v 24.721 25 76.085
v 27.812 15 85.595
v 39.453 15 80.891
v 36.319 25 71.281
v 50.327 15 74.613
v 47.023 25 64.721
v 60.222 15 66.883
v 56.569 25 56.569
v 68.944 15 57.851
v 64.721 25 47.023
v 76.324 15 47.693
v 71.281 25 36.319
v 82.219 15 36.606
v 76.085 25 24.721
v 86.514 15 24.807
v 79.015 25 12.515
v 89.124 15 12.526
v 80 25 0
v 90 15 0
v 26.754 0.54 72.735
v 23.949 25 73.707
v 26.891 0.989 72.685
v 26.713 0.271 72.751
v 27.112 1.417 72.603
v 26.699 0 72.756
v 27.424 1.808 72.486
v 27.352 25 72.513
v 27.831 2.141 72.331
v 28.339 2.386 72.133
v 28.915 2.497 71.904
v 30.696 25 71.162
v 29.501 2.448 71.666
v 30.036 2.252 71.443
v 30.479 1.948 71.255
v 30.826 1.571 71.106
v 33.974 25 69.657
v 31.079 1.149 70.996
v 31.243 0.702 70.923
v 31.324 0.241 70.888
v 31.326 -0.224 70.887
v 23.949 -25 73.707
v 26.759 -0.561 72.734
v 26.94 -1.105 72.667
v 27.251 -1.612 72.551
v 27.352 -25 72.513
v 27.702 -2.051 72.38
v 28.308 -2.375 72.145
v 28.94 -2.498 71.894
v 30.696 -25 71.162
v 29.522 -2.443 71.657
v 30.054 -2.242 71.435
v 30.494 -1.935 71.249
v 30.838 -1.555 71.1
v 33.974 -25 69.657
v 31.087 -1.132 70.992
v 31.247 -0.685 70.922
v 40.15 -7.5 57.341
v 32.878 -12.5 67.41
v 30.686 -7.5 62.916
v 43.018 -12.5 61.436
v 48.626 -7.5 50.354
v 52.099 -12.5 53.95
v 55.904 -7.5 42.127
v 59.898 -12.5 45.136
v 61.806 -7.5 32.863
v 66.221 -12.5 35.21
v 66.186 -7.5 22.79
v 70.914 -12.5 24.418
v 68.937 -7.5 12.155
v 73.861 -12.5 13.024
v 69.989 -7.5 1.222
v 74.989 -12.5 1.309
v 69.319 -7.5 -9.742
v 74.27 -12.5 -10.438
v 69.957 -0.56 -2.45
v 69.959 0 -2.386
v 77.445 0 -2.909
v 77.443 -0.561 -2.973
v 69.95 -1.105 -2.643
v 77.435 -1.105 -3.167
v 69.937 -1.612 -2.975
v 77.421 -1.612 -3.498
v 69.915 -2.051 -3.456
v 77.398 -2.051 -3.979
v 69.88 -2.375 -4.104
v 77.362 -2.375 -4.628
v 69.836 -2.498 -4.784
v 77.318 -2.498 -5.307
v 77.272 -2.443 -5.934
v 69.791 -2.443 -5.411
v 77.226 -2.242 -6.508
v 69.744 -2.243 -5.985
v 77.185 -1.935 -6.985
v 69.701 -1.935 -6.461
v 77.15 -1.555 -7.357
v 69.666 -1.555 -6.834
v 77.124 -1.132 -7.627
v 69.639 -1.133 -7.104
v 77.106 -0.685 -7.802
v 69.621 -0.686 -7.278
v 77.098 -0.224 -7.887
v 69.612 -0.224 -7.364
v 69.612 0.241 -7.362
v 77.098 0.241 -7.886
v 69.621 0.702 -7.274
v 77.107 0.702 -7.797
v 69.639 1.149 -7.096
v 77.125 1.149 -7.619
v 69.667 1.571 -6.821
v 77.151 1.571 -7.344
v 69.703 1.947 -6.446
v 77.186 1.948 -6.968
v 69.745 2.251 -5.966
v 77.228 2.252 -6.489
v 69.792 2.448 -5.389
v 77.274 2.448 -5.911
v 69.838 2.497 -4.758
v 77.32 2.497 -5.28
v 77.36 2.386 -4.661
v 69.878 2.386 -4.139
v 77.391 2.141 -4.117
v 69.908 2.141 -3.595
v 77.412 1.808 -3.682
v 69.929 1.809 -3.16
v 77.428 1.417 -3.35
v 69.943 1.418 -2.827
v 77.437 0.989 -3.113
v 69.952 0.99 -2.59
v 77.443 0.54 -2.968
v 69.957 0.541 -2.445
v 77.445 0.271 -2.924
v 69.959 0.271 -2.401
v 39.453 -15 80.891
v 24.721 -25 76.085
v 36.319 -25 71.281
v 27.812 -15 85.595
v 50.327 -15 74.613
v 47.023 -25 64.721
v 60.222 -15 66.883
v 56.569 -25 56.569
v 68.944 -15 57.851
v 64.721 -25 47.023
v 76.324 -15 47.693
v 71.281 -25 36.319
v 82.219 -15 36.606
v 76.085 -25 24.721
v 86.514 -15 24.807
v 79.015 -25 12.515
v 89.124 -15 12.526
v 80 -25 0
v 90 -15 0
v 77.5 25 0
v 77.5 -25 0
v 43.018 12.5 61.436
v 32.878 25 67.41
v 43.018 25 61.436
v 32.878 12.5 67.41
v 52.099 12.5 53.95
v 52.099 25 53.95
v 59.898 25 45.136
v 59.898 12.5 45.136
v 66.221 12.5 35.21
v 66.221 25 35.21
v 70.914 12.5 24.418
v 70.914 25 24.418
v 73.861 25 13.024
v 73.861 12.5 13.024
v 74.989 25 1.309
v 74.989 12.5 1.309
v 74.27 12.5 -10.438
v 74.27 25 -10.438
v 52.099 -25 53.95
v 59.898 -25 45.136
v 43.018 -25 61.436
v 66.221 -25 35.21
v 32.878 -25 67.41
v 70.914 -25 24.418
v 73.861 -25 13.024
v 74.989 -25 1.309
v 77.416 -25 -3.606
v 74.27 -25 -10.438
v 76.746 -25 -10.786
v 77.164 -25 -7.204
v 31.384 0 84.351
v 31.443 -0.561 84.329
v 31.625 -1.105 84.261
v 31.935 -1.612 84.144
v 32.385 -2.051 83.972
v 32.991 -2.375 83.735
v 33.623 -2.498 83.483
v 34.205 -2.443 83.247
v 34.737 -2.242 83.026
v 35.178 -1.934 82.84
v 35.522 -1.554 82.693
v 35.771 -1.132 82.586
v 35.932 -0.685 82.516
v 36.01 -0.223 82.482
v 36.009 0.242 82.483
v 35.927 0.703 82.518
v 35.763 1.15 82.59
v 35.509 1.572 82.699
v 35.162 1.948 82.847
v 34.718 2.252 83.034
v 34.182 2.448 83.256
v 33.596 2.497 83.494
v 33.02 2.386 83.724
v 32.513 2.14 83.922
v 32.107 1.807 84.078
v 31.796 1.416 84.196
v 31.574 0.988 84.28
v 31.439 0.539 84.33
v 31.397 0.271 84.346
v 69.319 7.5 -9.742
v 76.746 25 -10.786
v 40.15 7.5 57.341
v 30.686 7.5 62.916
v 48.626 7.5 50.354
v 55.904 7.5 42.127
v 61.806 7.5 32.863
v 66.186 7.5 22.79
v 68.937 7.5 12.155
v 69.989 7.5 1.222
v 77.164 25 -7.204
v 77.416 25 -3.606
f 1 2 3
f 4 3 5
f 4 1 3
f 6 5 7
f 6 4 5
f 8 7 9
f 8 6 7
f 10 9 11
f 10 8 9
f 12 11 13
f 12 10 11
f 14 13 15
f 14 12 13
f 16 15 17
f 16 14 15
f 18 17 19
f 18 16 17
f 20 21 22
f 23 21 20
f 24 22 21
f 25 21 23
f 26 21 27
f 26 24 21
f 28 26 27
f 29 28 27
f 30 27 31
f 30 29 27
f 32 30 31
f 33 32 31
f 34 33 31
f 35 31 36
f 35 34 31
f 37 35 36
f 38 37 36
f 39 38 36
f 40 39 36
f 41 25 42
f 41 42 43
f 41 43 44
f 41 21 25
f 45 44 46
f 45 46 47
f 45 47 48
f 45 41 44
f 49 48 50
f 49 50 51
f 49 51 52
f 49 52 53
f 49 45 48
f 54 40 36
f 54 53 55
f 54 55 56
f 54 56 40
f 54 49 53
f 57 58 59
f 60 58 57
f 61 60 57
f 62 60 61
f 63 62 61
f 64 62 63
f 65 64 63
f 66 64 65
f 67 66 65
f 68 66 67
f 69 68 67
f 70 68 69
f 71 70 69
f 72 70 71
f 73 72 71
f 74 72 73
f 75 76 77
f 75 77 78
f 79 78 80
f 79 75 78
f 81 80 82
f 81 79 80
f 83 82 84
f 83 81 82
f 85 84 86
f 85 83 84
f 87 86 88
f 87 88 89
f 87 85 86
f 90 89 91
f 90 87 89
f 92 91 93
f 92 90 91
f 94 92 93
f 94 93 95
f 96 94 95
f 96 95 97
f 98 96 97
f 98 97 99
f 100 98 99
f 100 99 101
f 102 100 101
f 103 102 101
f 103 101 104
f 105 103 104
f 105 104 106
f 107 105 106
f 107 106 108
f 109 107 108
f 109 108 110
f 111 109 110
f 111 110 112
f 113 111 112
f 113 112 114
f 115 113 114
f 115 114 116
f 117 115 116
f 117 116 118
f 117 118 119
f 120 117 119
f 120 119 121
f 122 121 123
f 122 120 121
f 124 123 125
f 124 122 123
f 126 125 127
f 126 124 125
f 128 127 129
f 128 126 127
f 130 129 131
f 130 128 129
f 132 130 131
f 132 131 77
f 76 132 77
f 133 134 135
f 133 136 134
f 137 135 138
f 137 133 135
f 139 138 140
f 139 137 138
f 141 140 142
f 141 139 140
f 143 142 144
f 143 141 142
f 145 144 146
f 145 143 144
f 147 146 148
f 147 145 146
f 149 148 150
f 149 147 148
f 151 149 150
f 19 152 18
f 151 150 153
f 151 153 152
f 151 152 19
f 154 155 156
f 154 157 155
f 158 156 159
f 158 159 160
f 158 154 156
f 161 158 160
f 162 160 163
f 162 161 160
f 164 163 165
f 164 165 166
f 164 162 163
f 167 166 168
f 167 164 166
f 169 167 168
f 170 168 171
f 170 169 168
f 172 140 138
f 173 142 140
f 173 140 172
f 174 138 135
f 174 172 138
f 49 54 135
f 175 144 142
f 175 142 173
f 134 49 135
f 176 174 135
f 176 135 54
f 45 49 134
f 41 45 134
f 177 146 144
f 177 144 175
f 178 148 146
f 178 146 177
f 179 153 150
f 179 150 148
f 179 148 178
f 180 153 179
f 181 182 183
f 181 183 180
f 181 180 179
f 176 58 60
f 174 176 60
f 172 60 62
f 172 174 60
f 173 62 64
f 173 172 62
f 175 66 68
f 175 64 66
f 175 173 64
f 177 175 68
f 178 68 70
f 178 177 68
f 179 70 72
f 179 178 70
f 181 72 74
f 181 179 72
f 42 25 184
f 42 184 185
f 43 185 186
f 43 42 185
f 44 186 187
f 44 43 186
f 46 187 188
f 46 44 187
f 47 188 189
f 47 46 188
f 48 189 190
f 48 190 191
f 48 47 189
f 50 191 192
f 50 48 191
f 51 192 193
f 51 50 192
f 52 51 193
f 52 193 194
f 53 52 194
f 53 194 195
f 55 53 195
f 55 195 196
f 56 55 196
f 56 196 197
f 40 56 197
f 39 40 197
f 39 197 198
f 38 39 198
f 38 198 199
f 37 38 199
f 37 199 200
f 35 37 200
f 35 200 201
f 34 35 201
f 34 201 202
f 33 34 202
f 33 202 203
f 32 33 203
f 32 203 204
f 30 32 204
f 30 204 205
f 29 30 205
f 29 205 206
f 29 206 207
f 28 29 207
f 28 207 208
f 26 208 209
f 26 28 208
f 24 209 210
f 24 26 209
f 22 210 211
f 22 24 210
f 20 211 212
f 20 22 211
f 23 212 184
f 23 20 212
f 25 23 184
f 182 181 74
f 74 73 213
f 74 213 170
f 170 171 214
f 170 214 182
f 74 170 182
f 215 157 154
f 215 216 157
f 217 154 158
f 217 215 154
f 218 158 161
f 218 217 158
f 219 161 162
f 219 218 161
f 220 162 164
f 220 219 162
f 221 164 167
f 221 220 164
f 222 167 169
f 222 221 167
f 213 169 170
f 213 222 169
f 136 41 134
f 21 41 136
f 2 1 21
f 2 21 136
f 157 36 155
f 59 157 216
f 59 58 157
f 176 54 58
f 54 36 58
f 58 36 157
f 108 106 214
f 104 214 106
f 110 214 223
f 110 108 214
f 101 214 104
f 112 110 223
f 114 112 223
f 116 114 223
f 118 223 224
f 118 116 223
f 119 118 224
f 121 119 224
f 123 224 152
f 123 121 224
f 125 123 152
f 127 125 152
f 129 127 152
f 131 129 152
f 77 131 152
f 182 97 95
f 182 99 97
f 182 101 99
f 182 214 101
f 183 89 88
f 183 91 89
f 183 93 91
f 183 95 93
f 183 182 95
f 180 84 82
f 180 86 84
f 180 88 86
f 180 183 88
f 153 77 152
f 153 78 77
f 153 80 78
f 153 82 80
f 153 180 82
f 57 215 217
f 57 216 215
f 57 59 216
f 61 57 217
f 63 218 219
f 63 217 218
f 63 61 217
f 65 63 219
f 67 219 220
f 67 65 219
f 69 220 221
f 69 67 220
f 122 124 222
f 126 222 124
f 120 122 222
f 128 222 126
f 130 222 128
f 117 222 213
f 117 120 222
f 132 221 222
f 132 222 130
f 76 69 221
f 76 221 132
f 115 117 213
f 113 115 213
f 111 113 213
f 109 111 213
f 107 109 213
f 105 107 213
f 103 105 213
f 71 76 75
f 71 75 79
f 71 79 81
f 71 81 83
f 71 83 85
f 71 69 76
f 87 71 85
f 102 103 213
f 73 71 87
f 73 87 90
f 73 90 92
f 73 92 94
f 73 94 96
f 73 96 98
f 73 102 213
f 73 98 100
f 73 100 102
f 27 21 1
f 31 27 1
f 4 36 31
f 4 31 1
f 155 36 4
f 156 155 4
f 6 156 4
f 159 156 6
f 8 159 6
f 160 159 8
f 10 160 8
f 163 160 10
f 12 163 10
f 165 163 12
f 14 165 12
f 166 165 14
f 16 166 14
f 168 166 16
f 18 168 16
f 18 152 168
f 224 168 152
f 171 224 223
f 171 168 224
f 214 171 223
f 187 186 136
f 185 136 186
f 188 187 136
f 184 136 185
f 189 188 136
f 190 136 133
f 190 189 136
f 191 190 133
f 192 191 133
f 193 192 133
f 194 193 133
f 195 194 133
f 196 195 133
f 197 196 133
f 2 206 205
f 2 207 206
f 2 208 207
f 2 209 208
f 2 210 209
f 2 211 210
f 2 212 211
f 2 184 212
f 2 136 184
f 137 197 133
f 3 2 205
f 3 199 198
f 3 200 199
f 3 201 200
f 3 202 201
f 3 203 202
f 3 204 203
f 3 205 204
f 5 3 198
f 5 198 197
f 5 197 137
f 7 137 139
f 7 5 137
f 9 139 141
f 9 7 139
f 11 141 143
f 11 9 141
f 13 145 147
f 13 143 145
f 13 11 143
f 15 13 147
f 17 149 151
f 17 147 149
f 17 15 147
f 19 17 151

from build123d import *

# Parameters (mm, degrees)
REVOLVE1_ANGLE           = 72
REVOLVE1_OTHER_WAY_ANGLE = 8
CUT_EXTRUDE2_DEPTH       = 127.694588784
CUT_EXTRUDE2_DEPTH_BACK  = 127.694588784
SKETCH5_R                = 2.5
CUT_EXTRUDE3_DEPTH       = 127.694588784
CIRPATTERN1_COUNT        = 2
CIRPATTERN1_ANGLE        = 72


with BuildPart() as part:
    # Sketch1 → Revolve1 (revolve)
    with BuildSketch(Plane.XY):
        Polygon((75, 25), (75, 12.5), (70, 7.5), (70, -7.5), (75, -12.5), (75, -25), (80, -25), (90, -15), (90, 15), (80, 25), align=None)
    revolve(axis=Axis((0, 54.030986193, 0), (0, -1, 0)), revolution_arc=REVOLVE1_ANGLE)

    # Sketch1 → Revolve1 other way (revolve)
    with BuildSketch(Plane.XY):
        Polygon((75, 25), (75, 12.5), (70, 7.5), (70, -7.5), (75, -12.5), (75, -25), (80, -25), (90, -15), (90, 15), (80, 25), align=None)
    revolve(axis=Axis((0, 54.030986193, 0), (0, 1, 0)), revolution_arc=REVOLVE1_OTHER_WAY_ANGLE)

    # Sketch2 → Cut-Extrude2 (cut, two sides: drawn at the far end of the back side and taken through both)
    with BuildSketch(Plane(origin=(0, 0, 0), x_dir=(1, 0, 0), z_dir=(0, 1, 0)).offset(-CUT_EXTRUDE2_DEPTH_BACK)):
        with BuildLine():
            ThreePointArc((76.745775327, 10.785915324), (77.311213895, 5.406126715), (77.5, 0))
            Line((77.5, 0), (90, 0))
            ThreePointArc((90, 0), (89.780764523, 6.278082637), (89.124126187, 12.525579086))
            Line((89.124126187, 12.525579086), (76.745775327, 10.785915324))
        make_face()
        with BuildLine():
            Line((33.973763876, -69.656538588), (30.685980275, -62.915583241))
            ThreePointArc((30.685980275, -62.915583241), (26.222461539, -64.90286982), (21.631189606, -66.573956141))
            Line((21.631189606, -66.573956141), (23.176274578, -71.329238722))
            Line((23.176274578, -71.329238722), (23.948817064, -73.706880013))
            ThreePointArc((23.948817064, -73.706880013), (29.03201099, -71.856748729), (33.973763876, -69.656538588))
        make_face()
    extrude(amount=CUT_EXTRUDE2_DEPTH + CUT_EXTRUDE2_DEPTH_BACK, mode=Mode.SUBTRACT)

    # Sketch5 → Cut-Extrude3 (cut, through all)
    with BuildSketch(Plane(origin=(0, 0, 0), x_dir=(0.9271838545667883, 0, -0.3746065934159098), z_dir=(0.3746065934159098, 0, 0.9271838545667883))):
        with Locations(Location((0, 0, 0), (0, 0, 180))):
            Circle(SKETCH5_R)
    cut_extrude3 = extrude(amount=CUT_EXTRUDE3_DEPTH, mode=Mode.SUBTRACT)

    # CirPattern1: Cut-Extrude3 ×2 about axis
    cirpattern1_axis = Axis((0, 54.030986193, 0), (0, 1, 0))
    for i in range(1, CIRPATTERN1_COUNT):
        add(cut_extrude3.rotate(cirpattern1_axis, i * CIRPATTERN1_ANGLE / (CIRPATTERN1_COUNT - 1)), mode=Mode.SUBTRACT)


solid = part.part
